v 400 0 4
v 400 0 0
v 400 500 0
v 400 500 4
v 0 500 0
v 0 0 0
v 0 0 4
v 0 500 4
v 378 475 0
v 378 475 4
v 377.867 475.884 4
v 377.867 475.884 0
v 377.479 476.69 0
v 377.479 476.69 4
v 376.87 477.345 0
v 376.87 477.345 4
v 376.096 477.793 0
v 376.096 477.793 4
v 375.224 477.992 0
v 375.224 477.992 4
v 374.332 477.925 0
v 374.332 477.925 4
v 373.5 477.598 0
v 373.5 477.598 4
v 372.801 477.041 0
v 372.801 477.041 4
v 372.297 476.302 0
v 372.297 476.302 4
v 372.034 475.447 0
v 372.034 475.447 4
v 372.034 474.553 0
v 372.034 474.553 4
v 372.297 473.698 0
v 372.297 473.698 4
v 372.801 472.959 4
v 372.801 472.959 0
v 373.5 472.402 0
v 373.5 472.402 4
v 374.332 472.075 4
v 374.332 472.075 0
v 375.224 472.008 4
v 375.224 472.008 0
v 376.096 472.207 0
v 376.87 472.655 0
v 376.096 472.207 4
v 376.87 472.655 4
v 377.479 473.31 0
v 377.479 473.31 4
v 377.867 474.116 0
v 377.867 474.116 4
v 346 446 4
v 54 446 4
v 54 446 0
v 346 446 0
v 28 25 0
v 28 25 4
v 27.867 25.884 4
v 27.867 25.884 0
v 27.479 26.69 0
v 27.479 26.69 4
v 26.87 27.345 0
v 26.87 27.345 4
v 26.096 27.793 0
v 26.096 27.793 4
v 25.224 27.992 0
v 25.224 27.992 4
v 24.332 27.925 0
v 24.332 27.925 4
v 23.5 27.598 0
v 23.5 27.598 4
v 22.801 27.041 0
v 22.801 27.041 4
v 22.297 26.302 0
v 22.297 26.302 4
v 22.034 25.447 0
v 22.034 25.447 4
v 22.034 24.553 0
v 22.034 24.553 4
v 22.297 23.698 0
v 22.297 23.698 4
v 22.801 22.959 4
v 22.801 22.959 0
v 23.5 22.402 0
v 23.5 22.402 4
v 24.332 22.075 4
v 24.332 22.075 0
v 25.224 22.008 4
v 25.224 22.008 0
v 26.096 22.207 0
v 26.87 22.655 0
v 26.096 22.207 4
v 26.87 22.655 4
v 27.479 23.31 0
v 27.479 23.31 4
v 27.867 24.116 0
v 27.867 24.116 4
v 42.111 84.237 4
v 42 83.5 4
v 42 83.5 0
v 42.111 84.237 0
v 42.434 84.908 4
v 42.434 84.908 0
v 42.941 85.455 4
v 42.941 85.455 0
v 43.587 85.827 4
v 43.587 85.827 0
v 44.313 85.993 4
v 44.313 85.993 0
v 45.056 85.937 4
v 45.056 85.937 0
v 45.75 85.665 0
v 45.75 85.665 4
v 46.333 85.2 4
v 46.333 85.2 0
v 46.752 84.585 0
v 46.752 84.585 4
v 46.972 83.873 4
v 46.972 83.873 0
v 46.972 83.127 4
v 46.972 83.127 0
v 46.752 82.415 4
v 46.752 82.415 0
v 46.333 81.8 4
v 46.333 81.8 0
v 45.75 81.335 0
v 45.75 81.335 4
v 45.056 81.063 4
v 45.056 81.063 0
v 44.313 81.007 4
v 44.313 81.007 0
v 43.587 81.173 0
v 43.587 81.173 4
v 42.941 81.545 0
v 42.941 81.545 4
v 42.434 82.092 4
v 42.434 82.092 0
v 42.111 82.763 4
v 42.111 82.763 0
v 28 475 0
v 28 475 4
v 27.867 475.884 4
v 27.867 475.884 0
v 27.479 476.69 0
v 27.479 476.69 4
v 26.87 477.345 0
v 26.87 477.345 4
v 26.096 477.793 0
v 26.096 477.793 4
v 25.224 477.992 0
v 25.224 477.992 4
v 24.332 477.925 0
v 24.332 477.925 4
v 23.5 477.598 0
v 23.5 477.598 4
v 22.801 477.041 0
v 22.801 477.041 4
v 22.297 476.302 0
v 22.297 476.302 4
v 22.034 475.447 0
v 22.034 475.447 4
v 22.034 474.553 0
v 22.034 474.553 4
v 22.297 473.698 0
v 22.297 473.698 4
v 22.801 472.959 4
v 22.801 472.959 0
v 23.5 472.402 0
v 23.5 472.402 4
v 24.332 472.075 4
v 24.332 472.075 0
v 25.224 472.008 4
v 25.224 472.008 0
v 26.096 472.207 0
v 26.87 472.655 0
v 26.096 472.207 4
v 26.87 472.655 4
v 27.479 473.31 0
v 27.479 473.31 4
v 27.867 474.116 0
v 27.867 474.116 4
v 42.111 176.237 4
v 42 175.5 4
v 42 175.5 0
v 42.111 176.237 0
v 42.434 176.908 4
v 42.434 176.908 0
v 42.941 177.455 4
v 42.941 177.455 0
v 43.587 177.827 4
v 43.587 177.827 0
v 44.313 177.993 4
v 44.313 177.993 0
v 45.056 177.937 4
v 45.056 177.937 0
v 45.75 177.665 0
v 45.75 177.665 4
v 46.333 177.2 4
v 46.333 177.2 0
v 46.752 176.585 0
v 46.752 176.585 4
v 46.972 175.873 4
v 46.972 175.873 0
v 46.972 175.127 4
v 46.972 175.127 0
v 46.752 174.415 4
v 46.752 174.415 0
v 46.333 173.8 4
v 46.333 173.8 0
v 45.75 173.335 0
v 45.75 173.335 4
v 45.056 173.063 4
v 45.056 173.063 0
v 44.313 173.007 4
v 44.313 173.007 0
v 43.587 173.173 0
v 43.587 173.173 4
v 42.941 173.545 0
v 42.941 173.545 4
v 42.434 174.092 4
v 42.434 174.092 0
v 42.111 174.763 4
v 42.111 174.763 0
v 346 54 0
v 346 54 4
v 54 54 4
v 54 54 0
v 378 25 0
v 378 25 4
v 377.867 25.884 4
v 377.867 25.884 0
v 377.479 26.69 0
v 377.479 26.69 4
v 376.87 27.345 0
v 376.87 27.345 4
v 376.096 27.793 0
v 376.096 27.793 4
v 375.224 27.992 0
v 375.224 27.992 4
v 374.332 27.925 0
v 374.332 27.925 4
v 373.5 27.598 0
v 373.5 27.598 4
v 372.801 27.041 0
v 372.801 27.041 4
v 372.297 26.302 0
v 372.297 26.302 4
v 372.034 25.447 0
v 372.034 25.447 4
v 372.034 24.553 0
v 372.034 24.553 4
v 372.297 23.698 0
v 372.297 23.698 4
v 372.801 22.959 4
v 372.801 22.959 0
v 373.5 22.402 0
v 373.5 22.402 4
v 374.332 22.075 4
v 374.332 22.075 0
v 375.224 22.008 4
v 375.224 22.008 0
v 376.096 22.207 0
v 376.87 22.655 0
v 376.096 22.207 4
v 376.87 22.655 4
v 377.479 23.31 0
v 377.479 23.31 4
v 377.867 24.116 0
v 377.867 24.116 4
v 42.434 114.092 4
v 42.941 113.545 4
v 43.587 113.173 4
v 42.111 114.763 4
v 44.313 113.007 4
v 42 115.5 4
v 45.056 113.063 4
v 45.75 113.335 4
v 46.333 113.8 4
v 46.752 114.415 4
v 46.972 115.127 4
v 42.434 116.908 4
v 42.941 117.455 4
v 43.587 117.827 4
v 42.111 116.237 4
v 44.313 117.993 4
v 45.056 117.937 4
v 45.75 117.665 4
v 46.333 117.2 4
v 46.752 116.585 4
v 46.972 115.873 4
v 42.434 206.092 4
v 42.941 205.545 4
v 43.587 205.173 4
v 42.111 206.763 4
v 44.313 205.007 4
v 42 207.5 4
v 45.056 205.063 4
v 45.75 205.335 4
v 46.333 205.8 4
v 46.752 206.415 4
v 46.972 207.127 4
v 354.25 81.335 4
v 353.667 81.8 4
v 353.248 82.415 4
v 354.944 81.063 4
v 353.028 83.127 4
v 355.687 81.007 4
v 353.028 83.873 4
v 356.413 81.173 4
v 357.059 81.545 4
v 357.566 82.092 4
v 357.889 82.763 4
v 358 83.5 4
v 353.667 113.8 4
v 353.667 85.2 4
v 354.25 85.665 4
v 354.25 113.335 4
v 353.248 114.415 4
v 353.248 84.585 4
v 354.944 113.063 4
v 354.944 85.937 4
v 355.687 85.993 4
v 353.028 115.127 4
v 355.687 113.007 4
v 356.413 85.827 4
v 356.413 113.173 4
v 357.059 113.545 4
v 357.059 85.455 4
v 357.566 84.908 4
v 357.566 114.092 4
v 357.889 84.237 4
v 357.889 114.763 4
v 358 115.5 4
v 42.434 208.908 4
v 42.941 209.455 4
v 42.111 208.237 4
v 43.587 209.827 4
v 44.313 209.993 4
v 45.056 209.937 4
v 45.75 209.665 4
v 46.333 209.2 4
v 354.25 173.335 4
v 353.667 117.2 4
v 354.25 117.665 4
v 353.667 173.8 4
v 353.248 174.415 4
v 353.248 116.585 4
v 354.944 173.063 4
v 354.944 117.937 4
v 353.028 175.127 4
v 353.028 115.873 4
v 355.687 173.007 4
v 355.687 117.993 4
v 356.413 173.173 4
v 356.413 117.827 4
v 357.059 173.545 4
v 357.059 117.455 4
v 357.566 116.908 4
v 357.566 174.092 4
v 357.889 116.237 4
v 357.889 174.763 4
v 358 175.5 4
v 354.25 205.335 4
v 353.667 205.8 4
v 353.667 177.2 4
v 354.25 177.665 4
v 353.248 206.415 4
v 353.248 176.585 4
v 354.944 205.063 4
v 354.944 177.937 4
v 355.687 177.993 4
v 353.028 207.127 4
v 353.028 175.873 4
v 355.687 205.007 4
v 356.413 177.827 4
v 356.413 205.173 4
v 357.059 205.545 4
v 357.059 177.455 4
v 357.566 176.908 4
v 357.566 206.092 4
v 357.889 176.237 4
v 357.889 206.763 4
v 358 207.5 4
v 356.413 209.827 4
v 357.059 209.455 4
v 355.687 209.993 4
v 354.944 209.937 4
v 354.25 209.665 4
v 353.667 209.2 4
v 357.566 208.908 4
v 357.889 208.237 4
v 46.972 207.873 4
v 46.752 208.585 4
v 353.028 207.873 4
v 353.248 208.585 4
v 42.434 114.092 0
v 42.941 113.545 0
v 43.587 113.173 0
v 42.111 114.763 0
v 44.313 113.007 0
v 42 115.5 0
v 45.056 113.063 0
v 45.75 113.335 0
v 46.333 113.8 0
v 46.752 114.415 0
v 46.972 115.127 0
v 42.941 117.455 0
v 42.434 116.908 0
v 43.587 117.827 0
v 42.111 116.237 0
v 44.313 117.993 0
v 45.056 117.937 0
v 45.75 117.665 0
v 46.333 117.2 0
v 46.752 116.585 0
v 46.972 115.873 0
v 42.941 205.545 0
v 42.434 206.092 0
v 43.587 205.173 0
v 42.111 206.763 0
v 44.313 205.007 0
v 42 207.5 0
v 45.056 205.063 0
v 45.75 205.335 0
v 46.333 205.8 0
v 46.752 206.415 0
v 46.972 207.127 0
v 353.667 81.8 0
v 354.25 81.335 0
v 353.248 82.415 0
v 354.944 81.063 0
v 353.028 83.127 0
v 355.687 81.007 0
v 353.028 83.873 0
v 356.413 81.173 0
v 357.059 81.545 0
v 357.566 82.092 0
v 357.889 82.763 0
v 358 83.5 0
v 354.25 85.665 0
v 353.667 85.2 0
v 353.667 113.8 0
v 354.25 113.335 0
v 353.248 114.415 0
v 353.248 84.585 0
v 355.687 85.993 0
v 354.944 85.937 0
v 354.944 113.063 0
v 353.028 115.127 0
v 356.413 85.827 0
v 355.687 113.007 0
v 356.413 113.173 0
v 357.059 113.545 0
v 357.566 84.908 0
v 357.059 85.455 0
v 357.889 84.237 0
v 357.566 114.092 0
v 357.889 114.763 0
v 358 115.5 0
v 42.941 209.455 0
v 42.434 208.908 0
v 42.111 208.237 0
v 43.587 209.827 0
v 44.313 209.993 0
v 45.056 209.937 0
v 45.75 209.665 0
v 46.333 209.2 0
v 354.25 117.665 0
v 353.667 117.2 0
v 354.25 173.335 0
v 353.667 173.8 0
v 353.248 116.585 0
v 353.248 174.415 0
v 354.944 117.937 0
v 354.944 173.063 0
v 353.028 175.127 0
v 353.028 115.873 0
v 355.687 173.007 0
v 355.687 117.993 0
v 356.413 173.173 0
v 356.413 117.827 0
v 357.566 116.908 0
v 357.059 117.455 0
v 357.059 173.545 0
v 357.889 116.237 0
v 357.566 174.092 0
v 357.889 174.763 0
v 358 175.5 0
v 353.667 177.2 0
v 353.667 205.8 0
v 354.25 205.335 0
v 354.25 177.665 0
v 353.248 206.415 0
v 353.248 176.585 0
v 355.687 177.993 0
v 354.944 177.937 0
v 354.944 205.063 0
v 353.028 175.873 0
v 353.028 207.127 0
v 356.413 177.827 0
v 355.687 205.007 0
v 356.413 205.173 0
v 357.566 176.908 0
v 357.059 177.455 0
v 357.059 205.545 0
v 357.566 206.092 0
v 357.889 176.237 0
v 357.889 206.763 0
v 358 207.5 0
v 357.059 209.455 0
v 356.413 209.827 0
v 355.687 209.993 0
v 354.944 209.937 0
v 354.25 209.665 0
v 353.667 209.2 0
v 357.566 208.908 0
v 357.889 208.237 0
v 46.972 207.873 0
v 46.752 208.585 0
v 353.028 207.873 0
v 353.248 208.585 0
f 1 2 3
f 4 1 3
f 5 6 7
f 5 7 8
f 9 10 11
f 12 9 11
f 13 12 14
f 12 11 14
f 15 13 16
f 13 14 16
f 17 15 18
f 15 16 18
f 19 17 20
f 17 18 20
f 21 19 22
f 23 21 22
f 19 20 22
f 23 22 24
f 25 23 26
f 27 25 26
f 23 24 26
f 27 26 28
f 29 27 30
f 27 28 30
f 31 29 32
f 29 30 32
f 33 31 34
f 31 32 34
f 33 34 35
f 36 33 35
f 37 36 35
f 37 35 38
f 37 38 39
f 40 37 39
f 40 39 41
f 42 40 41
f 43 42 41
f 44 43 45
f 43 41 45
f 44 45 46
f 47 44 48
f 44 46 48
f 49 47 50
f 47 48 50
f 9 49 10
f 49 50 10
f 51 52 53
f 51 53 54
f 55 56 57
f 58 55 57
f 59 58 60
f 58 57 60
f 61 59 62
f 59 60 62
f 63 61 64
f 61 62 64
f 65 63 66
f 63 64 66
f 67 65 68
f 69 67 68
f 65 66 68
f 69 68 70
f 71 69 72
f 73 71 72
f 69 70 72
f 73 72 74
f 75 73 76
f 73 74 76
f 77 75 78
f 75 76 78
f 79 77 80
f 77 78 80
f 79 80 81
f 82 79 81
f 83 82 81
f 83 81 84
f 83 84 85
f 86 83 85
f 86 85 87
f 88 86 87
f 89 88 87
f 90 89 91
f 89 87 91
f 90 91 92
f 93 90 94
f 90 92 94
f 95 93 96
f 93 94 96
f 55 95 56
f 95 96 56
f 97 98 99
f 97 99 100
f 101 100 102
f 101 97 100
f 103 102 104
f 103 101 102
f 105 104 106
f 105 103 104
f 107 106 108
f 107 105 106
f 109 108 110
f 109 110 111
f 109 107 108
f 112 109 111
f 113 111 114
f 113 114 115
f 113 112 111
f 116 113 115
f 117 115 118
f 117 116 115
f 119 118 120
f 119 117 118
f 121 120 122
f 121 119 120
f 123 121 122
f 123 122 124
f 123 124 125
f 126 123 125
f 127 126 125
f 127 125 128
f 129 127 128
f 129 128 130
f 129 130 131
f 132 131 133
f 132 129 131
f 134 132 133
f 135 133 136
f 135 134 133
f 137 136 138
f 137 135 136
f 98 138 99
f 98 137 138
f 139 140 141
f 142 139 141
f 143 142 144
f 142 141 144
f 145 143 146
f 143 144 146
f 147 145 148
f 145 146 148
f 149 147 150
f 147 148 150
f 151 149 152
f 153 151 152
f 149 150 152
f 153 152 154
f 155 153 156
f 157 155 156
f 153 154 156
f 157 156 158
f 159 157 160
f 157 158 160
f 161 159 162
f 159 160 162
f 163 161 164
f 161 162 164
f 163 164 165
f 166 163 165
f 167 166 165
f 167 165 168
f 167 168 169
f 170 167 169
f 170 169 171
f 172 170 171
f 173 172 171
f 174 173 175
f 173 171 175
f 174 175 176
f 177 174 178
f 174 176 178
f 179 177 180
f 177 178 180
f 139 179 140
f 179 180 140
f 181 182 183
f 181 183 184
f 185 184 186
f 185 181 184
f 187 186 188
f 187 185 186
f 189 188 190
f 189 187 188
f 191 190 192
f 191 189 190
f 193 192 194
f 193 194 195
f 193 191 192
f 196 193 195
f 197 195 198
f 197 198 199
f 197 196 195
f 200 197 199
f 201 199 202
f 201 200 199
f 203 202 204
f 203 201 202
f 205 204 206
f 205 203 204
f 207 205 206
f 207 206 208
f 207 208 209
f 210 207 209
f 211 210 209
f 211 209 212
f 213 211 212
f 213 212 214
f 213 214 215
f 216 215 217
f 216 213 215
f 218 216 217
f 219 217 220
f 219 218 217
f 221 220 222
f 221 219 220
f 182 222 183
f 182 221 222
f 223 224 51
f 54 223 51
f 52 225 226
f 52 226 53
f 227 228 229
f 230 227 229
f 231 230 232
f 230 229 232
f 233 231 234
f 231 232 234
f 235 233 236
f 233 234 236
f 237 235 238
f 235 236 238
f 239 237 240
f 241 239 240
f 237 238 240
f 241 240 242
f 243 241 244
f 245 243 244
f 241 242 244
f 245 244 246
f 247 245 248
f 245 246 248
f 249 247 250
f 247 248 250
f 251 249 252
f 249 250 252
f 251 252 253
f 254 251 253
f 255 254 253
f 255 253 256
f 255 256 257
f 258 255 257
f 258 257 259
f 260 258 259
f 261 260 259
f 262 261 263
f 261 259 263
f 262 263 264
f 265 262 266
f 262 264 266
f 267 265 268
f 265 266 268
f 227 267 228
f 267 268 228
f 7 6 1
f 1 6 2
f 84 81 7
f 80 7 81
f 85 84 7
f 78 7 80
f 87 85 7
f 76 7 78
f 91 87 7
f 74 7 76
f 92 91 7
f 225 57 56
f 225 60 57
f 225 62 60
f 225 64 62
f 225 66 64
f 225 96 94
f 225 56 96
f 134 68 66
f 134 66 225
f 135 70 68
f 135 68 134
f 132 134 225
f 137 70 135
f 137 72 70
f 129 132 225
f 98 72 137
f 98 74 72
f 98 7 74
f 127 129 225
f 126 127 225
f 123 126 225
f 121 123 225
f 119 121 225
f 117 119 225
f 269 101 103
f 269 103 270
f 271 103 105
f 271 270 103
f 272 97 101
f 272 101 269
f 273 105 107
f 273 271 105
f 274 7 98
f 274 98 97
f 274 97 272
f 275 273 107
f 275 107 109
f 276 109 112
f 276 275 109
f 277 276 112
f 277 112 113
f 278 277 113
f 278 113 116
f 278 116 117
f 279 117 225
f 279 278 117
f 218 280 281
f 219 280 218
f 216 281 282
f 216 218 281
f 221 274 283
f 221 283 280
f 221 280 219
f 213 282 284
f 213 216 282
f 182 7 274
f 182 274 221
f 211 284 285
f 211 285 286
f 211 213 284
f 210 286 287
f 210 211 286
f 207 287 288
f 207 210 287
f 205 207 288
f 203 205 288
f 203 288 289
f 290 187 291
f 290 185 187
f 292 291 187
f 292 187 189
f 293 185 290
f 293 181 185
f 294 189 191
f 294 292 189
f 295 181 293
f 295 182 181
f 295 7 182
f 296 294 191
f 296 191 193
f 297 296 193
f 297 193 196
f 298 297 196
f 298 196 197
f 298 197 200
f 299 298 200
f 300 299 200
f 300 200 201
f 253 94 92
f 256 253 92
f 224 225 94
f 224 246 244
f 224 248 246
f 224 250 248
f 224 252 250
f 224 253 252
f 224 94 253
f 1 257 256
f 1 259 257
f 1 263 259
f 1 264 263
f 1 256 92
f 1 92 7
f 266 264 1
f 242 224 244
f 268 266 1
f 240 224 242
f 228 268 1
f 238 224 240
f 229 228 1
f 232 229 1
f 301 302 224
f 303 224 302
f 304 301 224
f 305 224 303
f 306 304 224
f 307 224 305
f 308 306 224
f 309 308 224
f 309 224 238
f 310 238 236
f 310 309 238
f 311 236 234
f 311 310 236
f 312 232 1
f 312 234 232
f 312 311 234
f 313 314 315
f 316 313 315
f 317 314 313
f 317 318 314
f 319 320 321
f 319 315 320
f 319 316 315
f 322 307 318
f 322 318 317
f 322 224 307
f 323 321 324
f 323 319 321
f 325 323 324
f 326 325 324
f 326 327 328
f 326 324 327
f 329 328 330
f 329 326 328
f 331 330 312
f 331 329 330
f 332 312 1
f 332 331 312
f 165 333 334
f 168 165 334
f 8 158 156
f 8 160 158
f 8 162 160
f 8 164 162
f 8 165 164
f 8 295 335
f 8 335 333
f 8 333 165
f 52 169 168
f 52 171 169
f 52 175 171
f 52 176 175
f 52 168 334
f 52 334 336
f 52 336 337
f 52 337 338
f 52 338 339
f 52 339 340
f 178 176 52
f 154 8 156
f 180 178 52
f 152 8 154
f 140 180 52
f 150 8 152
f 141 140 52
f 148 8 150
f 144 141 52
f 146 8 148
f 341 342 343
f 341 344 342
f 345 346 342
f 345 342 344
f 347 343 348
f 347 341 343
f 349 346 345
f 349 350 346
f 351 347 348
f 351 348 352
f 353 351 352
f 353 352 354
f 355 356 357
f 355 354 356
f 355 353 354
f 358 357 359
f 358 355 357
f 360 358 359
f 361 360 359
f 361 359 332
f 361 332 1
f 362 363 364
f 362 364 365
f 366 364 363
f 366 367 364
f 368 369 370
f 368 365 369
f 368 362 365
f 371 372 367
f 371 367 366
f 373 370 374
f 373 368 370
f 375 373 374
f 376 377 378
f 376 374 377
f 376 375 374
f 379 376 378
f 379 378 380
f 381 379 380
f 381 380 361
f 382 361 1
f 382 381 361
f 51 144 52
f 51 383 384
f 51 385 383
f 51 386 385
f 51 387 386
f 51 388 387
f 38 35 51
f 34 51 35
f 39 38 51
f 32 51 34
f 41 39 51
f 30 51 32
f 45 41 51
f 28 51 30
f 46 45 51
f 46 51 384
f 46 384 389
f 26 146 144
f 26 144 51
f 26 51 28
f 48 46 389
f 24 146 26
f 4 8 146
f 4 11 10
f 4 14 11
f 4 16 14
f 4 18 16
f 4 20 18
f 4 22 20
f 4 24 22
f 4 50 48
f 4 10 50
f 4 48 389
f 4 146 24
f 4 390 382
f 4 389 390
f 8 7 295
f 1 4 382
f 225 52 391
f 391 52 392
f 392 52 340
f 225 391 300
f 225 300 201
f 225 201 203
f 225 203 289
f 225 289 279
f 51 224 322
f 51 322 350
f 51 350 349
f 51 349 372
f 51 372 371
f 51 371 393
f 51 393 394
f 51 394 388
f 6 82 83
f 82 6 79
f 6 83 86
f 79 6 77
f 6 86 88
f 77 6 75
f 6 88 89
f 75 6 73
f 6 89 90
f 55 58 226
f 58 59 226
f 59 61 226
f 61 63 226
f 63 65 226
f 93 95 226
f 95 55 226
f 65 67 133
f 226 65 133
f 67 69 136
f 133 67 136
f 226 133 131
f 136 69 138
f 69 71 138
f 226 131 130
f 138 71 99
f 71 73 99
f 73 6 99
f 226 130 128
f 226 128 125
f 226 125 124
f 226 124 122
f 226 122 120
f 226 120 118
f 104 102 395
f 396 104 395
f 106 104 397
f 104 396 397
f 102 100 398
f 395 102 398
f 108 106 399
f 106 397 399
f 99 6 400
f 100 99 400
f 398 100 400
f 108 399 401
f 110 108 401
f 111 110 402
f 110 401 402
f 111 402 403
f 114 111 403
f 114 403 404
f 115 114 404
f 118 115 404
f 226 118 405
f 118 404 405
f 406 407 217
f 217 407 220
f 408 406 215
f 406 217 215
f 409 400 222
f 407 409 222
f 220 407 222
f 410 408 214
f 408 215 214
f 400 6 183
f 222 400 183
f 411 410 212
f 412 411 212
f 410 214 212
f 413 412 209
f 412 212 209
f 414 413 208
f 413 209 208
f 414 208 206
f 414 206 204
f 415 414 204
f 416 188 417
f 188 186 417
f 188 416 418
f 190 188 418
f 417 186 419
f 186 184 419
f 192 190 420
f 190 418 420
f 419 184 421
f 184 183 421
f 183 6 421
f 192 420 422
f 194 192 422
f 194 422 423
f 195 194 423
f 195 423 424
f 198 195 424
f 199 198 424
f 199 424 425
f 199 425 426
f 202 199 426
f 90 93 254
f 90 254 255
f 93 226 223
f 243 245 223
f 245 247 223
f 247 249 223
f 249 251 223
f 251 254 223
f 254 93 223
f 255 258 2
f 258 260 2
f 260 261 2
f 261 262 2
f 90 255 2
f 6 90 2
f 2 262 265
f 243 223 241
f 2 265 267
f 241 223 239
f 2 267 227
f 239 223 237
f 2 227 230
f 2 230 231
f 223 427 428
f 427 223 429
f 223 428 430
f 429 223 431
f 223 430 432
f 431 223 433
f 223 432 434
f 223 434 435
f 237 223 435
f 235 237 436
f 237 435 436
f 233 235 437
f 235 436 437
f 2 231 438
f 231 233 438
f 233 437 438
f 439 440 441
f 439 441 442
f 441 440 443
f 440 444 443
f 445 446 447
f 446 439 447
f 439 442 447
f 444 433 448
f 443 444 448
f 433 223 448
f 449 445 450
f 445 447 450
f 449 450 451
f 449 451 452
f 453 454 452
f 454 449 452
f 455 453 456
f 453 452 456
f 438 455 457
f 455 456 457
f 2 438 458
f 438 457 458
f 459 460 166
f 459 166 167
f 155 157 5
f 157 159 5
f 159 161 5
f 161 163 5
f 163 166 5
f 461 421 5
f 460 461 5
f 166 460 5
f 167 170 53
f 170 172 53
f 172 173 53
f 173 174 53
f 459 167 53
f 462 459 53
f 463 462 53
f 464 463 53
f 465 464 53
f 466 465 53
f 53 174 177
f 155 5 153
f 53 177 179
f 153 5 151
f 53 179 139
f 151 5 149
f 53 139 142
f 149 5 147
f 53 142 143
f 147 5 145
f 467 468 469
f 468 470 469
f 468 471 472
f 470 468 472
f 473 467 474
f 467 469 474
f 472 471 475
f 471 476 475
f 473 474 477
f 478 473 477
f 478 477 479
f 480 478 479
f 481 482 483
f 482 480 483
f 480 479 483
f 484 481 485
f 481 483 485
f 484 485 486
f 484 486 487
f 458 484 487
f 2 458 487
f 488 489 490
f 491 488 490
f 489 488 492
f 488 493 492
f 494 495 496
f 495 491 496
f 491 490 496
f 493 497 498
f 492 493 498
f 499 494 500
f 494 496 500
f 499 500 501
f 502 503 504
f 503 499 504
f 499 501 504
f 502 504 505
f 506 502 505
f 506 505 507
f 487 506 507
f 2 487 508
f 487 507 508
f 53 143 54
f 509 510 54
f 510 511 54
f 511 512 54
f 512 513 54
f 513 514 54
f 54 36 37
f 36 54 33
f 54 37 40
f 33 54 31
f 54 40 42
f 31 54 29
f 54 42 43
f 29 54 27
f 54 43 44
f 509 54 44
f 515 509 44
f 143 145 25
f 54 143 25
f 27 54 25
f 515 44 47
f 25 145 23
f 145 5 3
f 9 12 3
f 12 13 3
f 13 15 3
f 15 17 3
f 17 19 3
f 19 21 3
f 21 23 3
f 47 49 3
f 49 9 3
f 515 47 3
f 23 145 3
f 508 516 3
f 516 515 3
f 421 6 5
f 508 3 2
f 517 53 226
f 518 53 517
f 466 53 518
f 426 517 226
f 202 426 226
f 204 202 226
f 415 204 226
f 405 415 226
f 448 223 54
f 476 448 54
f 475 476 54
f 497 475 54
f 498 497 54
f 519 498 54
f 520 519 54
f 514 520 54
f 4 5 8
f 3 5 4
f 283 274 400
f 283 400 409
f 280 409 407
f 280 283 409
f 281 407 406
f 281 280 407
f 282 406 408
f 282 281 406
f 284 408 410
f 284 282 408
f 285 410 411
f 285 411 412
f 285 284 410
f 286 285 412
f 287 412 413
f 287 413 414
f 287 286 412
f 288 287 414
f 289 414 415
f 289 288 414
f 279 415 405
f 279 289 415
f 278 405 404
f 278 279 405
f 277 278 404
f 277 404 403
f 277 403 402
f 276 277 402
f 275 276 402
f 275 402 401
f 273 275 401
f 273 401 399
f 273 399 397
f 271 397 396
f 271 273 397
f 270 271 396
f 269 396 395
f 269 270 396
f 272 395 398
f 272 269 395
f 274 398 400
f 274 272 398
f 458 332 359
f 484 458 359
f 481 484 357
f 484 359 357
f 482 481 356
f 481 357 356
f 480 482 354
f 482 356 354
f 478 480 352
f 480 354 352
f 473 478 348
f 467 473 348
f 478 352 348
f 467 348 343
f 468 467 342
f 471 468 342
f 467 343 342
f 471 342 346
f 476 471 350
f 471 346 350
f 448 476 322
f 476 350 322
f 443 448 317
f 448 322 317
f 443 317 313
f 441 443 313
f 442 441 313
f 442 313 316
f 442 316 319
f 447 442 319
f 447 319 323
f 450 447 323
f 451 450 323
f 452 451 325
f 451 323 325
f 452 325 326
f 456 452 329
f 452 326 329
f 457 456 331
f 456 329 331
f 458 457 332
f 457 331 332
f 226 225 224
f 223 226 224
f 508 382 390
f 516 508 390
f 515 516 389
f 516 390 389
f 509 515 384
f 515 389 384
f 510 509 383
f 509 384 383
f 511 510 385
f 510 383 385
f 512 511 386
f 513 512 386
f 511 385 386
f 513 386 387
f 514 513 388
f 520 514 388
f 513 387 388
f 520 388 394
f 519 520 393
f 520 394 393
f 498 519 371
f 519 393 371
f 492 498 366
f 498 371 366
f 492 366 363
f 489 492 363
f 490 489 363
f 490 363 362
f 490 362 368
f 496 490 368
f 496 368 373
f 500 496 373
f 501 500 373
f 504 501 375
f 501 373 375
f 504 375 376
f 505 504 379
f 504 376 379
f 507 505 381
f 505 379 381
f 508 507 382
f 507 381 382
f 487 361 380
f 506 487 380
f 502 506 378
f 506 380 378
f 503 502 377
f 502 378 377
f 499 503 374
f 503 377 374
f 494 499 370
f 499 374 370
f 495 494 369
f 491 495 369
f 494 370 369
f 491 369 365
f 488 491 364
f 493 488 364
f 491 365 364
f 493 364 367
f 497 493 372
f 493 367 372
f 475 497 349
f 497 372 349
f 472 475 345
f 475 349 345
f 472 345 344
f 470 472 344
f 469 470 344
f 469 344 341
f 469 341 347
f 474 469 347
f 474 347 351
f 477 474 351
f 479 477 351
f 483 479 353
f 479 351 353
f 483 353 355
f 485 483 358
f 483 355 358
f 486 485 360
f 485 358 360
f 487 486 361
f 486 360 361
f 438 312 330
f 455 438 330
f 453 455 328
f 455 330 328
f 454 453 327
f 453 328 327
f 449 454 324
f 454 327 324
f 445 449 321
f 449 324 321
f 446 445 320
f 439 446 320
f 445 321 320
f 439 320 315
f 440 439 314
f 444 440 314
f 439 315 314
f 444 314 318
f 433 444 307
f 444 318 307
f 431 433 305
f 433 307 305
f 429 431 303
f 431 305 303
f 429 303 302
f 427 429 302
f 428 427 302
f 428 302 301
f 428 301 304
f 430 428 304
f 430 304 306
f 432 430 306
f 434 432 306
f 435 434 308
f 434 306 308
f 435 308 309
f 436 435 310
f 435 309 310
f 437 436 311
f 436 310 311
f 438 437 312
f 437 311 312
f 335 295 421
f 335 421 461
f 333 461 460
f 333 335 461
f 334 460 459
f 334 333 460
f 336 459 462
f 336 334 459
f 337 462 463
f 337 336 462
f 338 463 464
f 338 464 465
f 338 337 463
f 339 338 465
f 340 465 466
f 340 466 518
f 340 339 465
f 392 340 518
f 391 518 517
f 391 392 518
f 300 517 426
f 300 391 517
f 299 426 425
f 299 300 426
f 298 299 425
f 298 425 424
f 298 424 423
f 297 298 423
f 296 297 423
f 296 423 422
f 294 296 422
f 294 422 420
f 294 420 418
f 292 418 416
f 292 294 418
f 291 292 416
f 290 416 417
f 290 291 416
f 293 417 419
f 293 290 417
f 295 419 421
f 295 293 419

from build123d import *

# Parameters (mm, degrees)
SKETCH1_W           = 400
SKETCH1_H           = 500
BOSS_EXTRUDE1_DEPTH = 4
CUT_EXTRUDE1_REACH  = 6
SKETCH3_W           = 292
SKETCH3_H           = 392
SKETCH6_R           = 2.5
CUT_EXTRUDE3_DEPTH  = 4
SKETCH7_R           = 3
CUT_EXTRUDE4_DEPTH  = 4


with BuildPart() as part:
    # Sketch1 → Boss-Extrude1 (new body)
    with BuildSketch(Plane.XY):
        with Locations((200, 250)):
            Rectangle(SKETCH1_W, SKETCH1_H)
    extrude(amount=BOSS_EXTRUDE1_DEPTH)

    # Sketch3 → Cut-Extrude1 (cut, up to next)
    with BuildSketch(Plane.XY.offset(4), mode=Mode.PRIVATE) as cut_extrude1_sk1:
        with Locations((200, 250)):
            Rectangle(SKETCH3_W, SKETCH3_H)
    cut_extrude1_tool1 = extrude(cut_extrude1_sk1.sketch, amount=-CUT_EXTRUDE1_REACH, mode=Mode.PRIVATE) & part.part
    add(cut_extrude1_tool1.solids().sort_by_distance((200, 250, 4))[0], mode=Mode.SUBTRACT)

    # Sketch6 → Cut-Extrude3 (cut)
    with BuildSketch(Plane.XY.offset(4)):
        with Locations((355.5, 83.5)):
            Circle(SKETCH6_R)
        with Locations((355.5, 115.5)):
            Circle(SKETCH6_R)
        with Locations((355.5, 175.5)):
            Circle(SKETCH6_R)
        with Locations((355.5, 207.5)):
            Circle(SKETCH6_R)
    cut_extrude3 = extrude(amount=-CUT_EXTRUDE3_DEPTH, mode=Mode.SUBTRACT)

    # Mirror1: Cut-Extrude3 across plane
    add(cut_extrude3.mirror(Plane(origin=(200, 0, 0), x_dir=(0, 0, 1), z_dir=(1, 0, 0))), mode=Mode.SUBTRACT)

    # Sketch7 → Cut-Extrude4 (cut)
    with BuildSketch(Plane.XY.offset(4)):
        with Locations((375, 475)):
            Circle(SKETCH7_R)
        with Locations((25, 475)):
            Circle(SKETCH7_R)
        with Locations((25, 25)):
            Circle(SKETCH7_R)
        with Locations((375, 25)):
            Circle(SKETCH7_R)
    extrude(amount=-CUT_EXTRUDE4_DEPTH, mode=Mode.SUBTRACT)


solid = part.part
